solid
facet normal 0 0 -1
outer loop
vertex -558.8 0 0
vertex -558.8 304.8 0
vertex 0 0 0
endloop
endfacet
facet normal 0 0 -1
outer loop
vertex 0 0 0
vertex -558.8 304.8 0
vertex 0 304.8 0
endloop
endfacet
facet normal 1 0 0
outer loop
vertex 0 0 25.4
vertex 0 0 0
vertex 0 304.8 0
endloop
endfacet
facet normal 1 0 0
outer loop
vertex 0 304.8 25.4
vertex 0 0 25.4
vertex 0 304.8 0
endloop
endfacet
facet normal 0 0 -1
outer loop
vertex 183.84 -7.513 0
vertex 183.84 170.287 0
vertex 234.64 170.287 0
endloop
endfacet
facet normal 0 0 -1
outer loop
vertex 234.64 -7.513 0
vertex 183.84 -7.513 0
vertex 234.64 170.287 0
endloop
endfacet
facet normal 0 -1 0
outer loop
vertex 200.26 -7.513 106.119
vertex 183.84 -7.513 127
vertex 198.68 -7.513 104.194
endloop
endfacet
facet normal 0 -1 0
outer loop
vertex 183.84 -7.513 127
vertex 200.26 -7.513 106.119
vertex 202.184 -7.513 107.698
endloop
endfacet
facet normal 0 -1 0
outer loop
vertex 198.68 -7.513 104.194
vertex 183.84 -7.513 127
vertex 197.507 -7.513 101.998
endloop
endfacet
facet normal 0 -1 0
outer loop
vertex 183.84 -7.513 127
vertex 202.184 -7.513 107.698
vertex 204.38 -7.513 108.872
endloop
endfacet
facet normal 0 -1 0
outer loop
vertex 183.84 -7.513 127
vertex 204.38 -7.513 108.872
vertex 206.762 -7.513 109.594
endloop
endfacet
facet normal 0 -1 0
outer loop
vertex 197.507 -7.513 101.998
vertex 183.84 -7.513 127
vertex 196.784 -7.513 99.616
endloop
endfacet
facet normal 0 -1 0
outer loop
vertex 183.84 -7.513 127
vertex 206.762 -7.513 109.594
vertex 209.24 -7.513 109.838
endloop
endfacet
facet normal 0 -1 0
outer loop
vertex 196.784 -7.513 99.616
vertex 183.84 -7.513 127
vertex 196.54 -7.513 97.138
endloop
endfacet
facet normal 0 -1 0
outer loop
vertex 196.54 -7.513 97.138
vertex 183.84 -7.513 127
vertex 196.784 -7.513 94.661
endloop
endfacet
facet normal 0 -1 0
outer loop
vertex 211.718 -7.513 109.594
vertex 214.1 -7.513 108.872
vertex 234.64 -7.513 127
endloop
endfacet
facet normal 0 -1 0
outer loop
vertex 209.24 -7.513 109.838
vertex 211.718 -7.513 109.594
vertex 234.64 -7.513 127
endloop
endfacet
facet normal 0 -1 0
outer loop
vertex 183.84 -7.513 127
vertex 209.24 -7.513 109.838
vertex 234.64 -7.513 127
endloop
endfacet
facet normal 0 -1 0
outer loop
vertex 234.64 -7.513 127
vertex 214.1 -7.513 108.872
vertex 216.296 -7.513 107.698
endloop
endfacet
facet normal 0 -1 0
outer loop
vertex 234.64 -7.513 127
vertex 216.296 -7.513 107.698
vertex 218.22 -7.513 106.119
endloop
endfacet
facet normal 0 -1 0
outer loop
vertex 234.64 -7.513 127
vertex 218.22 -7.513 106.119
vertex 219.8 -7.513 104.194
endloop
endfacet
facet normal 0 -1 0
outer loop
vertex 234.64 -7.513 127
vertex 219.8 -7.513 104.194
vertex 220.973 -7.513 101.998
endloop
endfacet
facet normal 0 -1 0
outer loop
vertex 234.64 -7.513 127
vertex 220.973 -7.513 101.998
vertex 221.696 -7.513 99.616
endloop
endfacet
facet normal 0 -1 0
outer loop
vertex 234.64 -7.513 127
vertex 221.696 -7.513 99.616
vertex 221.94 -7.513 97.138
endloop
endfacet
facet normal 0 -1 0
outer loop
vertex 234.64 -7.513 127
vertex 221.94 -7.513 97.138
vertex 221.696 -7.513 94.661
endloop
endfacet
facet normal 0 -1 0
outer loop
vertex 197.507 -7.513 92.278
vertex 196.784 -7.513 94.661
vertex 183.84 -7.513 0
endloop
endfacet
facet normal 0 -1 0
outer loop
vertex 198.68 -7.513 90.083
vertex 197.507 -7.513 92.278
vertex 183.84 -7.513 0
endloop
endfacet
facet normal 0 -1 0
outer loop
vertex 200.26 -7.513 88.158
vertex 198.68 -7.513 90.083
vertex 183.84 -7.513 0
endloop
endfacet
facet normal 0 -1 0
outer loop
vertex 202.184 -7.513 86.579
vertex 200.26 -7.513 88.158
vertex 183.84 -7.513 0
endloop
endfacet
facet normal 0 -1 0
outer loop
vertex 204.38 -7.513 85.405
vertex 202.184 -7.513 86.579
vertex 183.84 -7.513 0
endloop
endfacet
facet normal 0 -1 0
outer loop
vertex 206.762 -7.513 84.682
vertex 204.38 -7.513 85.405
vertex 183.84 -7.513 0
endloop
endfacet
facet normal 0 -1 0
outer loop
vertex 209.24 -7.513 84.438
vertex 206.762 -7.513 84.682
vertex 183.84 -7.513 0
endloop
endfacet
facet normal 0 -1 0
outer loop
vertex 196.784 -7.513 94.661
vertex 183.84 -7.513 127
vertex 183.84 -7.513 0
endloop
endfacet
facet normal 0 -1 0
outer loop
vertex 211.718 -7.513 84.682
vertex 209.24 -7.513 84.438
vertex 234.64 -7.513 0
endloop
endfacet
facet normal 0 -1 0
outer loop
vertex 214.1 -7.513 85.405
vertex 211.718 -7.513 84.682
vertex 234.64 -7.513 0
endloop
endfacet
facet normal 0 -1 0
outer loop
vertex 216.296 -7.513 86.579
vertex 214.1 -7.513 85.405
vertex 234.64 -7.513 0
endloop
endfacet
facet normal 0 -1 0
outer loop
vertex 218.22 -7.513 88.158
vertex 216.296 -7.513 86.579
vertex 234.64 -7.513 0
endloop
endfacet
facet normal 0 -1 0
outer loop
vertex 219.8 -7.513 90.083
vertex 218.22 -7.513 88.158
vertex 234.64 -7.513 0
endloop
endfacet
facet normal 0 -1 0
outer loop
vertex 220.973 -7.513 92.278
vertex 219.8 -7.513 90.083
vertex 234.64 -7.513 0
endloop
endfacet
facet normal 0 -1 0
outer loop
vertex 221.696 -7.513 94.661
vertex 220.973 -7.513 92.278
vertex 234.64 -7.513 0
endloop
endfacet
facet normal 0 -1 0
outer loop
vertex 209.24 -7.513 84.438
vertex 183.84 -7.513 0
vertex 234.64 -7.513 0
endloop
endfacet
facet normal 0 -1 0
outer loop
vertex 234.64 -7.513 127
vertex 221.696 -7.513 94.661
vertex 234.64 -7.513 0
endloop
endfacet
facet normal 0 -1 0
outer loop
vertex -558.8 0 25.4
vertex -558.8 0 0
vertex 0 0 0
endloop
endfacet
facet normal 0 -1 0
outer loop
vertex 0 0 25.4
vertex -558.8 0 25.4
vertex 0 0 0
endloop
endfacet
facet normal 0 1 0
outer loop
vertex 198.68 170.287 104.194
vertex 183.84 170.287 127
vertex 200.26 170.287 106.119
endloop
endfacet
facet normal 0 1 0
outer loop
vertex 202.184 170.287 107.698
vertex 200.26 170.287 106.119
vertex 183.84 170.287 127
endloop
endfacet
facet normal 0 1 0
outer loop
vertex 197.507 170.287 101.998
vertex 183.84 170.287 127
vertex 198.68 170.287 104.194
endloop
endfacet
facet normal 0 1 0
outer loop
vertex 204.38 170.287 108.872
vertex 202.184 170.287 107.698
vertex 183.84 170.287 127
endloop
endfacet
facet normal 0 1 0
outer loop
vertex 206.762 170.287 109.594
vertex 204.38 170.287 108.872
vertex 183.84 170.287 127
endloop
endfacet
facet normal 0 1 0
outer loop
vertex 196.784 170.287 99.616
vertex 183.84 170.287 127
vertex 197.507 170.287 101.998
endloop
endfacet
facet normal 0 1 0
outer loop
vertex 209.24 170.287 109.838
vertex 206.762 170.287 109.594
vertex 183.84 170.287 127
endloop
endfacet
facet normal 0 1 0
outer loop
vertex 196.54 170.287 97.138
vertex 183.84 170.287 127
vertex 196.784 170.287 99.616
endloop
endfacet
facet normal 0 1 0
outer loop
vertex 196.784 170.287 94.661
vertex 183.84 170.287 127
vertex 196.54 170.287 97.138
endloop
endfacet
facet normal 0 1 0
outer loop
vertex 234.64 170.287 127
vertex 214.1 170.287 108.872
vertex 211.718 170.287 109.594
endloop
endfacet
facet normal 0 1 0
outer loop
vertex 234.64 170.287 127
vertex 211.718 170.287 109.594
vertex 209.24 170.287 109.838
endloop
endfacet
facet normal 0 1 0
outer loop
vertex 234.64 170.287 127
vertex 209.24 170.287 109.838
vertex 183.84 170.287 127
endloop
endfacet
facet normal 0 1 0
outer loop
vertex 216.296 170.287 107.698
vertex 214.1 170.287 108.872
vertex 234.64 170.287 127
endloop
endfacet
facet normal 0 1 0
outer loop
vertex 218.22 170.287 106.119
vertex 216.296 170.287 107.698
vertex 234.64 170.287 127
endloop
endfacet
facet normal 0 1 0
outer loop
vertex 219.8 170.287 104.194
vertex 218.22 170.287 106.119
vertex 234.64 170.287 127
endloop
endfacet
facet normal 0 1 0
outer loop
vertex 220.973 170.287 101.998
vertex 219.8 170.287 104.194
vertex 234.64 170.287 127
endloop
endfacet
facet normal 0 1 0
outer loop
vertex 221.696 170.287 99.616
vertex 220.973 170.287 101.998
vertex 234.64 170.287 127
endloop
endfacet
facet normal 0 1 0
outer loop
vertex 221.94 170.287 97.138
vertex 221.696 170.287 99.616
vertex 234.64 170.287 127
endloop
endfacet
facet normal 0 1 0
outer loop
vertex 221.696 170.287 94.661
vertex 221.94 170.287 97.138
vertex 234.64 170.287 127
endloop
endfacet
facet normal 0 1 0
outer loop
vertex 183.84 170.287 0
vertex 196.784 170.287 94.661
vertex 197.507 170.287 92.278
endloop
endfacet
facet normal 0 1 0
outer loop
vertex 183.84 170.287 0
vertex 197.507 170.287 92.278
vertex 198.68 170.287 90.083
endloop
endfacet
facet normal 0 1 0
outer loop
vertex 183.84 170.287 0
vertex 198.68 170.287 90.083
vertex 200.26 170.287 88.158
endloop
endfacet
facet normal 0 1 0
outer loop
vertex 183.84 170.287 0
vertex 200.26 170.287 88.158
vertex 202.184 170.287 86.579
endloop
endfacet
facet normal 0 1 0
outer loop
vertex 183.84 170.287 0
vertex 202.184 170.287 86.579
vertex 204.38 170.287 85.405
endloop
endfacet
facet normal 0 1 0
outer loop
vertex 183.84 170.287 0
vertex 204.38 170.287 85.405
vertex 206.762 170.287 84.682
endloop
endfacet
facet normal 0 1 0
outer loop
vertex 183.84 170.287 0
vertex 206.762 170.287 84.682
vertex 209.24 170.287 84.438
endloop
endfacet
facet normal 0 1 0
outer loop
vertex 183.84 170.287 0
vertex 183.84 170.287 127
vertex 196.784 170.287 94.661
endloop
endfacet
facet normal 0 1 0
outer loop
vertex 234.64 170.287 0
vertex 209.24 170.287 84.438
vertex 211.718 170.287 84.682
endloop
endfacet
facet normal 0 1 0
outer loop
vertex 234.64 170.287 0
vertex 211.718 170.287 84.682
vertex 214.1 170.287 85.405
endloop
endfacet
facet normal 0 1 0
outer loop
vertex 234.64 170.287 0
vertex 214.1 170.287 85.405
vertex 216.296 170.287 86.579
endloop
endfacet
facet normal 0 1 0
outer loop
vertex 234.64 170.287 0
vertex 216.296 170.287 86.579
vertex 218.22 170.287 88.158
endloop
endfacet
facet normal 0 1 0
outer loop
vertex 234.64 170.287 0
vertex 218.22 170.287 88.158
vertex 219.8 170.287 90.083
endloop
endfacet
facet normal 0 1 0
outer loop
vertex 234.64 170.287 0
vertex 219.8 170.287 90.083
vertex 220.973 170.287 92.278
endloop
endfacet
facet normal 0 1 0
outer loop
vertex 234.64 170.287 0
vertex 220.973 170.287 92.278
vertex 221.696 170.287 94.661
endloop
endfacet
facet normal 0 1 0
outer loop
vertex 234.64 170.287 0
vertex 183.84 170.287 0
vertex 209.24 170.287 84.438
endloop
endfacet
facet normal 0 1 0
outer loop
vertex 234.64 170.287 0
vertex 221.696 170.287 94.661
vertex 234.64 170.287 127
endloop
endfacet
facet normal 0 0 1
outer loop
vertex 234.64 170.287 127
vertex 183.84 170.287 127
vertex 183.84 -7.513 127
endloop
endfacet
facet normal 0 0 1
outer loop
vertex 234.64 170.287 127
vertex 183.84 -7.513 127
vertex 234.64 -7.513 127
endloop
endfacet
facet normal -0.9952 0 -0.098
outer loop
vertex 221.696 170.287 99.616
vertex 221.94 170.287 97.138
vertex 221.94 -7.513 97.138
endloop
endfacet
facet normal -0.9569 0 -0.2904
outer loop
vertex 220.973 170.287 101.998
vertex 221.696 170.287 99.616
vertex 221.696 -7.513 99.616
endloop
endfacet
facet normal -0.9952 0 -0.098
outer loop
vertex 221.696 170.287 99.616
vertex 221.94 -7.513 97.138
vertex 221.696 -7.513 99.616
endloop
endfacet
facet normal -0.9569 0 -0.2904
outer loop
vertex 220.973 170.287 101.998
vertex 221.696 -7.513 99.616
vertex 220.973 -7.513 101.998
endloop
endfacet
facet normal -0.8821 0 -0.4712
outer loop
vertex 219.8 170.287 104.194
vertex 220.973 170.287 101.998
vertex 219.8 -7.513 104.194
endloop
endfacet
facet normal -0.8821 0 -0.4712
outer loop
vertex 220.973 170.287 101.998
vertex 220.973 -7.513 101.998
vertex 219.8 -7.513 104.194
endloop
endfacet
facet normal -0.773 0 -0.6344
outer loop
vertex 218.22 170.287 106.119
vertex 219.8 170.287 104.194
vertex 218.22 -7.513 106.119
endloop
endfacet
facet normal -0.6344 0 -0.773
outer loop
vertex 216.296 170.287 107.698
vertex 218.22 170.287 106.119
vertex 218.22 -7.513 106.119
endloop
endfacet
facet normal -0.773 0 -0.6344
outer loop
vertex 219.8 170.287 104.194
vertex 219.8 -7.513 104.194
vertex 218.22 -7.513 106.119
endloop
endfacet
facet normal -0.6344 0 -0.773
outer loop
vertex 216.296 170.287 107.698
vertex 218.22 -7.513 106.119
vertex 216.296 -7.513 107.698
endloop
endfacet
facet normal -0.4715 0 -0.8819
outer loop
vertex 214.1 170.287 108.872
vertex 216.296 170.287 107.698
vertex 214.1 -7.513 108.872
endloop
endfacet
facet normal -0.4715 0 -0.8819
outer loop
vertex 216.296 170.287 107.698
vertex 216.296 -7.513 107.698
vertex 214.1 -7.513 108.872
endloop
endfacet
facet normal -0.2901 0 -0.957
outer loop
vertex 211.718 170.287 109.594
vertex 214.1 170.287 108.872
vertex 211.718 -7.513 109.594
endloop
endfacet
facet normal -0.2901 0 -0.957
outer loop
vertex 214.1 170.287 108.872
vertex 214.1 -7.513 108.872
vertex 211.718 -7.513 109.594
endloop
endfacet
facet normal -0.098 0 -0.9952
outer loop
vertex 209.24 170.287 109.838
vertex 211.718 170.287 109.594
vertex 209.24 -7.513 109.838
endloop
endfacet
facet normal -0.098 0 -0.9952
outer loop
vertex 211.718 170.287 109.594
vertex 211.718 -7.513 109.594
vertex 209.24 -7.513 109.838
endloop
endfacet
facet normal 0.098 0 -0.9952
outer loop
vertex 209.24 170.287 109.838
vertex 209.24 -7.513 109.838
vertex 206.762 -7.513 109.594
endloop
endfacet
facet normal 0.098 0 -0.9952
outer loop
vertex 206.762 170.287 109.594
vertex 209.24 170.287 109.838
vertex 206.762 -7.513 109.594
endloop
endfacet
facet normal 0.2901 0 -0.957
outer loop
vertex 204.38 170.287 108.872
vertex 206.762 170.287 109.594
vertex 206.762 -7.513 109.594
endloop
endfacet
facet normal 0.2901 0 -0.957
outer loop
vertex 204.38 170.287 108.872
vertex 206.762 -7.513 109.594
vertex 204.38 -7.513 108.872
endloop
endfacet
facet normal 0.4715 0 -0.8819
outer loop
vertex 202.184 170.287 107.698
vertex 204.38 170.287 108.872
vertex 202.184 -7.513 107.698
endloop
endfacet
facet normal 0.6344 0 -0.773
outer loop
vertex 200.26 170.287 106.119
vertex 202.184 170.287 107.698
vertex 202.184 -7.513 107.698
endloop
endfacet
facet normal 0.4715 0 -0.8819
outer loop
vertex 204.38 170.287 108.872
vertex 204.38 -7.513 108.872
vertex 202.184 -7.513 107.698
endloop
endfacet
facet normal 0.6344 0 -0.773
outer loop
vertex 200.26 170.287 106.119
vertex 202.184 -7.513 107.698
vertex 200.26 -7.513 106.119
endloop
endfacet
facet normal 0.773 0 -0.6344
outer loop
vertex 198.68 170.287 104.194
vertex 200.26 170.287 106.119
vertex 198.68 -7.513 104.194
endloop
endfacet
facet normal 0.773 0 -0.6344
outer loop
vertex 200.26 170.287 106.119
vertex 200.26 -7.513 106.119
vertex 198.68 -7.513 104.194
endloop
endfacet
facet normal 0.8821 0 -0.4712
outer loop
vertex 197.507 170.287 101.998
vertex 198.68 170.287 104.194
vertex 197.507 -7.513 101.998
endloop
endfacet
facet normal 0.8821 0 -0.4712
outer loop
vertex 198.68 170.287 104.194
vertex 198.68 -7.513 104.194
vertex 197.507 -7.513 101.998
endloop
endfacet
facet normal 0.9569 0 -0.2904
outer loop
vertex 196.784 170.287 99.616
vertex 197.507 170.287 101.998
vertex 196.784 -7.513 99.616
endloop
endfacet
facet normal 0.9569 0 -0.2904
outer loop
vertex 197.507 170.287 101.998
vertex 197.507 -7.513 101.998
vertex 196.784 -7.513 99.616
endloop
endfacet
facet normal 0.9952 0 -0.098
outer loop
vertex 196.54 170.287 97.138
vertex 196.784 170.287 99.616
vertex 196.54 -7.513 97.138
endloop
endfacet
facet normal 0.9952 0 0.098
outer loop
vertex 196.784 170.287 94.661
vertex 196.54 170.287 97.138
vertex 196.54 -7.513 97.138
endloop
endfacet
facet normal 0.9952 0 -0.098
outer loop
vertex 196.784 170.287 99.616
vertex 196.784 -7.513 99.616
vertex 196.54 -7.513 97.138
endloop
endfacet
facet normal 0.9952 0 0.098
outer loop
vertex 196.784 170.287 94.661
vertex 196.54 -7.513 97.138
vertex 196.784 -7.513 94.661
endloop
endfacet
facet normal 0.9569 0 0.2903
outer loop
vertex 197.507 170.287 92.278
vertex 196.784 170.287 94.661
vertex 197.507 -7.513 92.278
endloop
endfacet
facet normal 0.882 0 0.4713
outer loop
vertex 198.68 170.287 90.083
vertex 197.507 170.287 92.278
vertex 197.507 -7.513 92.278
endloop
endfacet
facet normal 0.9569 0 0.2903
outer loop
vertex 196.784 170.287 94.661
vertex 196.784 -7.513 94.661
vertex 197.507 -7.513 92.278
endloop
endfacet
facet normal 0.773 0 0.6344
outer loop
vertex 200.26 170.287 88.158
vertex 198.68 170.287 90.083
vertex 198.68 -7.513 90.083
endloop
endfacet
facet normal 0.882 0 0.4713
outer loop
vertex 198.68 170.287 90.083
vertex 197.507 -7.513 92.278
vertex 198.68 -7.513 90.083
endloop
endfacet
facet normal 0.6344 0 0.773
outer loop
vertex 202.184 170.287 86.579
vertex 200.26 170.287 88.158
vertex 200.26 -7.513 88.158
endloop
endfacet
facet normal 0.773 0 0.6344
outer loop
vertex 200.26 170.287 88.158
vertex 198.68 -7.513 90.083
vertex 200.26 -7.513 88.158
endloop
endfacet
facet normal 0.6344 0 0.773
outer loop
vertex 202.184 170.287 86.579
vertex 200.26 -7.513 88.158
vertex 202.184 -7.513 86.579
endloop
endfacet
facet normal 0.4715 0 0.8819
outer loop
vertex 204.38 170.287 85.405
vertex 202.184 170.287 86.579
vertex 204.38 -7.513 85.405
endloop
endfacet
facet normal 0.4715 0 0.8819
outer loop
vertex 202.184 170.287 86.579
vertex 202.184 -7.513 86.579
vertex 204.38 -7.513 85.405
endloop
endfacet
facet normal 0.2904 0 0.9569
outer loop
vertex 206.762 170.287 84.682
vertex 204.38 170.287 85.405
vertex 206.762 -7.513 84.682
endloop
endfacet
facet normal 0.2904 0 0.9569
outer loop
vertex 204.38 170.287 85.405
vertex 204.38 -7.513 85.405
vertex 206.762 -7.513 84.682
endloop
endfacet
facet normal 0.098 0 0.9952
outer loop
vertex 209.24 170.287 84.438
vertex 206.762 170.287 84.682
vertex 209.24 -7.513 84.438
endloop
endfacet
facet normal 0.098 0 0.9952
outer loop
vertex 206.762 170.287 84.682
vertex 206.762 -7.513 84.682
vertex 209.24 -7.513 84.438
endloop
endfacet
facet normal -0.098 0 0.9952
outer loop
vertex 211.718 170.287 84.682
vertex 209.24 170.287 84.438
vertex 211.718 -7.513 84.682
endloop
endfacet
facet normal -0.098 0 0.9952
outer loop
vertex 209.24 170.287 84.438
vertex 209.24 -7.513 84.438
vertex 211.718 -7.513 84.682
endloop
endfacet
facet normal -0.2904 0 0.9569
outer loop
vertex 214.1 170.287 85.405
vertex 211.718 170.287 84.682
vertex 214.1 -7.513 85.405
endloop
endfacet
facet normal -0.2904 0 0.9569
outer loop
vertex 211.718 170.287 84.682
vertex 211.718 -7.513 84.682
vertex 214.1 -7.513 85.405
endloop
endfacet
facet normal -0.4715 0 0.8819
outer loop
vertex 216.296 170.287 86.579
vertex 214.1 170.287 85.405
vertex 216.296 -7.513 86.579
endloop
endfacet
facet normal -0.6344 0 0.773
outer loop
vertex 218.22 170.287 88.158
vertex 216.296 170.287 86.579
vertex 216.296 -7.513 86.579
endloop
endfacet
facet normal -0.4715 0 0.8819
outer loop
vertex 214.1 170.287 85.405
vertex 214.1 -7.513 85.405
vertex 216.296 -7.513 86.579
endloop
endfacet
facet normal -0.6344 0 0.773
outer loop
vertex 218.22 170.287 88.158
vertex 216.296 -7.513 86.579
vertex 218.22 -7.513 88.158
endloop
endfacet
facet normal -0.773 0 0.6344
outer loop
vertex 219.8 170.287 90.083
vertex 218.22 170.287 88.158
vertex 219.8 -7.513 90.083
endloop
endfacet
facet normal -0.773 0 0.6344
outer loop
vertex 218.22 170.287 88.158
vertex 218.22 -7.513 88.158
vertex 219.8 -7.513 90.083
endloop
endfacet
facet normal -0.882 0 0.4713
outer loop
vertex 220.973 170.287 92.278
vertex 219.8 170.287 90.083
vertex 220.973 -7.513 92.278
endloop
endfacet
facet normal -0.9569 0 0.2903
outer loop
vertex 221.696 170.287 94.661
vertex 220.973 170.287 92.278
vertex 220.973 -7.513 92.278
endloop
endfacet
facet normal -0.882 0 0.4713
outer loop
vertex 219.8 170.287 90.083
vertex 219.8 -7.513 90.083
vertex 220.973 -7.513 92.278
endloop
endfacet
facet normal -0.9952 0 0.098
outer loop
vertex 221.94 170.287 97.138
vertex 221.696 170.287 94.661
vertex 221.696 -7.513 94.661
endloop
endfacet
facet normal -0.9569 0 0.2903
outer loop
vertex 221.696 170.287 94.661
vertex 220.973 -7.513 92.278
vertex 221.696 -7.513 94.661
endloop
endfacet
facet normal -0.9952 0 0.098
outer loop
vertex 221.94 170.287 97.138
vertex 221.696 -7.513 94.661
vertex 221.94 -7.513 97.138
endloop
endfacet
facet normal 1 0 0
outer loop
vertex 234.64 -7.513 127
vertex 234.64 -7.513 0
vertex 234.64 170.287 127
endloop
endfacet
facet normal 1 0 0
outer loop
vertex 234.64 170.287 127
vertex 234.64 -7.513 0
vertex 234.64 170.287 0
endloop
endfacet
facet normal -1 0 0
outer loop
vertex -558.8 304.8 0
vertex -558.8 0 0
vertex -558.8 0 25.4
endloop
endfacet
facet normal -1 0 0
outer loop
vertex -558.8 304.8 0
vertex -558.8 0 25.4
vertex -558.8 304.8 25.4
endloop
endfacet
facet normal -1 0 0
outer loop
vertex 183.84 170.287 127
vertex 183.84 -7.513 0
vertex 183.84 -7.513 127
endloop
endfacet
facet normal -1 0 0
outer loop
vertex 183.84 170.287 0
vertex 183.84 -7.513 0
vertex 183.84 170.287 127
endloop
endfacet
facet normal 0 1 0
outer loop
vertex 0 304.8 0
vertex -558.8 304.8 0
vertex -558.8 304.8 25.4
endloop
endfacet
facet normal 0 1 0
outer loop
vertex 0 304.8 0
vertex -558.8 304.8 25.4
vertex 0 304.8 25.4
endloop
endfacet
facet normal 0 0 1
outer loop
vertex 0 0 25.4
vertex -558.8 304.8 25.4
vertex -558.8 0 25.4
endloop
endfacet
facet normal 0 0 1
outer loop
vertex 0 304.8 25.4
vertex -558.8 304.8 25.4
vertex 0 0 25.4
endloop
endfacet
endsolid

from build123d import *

# Parameters (mm, degrees)
F0_W     = 50.8
F0_H     = 177.8
F1_DEPTH = 127
F0_W_2   = 558.8
F0_H_2   = 304.8
F2_DEPTH = 25.4
F3_R     = 12.7
F4_DEPTH = 177.8


with BuildPart() as f1:
    # F0 (on Top) → F1 (new body)
    with BuildSketch(Plane.XY):
        with Locations((209.239962, 81.387412)):
            Rectangle(F0_W, F0_H)
    extrude(amount=F1_DEPTH)

    # F3 (on face) → F4 (cut, through all)
    with BuildSketch(Plane.XZ.offset(7.512588)):
        with Locations((209.239962, 97.138271)):
            Circle(F3_R)
    extrude(amount=-F4_DEPTH, mode=Mode.SUBTRACT)


with BuildPart() as f2:
    # F0 (on Top) → F2 (new body)
    with BuildSketch(Plane.XY):
        with Locations((-279.4, 152.4)):
            Rectangle(F0_W_2, F0_H_2)
    extrude(amount=F2_DEPTH)


solid = Compound([f1.part, f2.part])
